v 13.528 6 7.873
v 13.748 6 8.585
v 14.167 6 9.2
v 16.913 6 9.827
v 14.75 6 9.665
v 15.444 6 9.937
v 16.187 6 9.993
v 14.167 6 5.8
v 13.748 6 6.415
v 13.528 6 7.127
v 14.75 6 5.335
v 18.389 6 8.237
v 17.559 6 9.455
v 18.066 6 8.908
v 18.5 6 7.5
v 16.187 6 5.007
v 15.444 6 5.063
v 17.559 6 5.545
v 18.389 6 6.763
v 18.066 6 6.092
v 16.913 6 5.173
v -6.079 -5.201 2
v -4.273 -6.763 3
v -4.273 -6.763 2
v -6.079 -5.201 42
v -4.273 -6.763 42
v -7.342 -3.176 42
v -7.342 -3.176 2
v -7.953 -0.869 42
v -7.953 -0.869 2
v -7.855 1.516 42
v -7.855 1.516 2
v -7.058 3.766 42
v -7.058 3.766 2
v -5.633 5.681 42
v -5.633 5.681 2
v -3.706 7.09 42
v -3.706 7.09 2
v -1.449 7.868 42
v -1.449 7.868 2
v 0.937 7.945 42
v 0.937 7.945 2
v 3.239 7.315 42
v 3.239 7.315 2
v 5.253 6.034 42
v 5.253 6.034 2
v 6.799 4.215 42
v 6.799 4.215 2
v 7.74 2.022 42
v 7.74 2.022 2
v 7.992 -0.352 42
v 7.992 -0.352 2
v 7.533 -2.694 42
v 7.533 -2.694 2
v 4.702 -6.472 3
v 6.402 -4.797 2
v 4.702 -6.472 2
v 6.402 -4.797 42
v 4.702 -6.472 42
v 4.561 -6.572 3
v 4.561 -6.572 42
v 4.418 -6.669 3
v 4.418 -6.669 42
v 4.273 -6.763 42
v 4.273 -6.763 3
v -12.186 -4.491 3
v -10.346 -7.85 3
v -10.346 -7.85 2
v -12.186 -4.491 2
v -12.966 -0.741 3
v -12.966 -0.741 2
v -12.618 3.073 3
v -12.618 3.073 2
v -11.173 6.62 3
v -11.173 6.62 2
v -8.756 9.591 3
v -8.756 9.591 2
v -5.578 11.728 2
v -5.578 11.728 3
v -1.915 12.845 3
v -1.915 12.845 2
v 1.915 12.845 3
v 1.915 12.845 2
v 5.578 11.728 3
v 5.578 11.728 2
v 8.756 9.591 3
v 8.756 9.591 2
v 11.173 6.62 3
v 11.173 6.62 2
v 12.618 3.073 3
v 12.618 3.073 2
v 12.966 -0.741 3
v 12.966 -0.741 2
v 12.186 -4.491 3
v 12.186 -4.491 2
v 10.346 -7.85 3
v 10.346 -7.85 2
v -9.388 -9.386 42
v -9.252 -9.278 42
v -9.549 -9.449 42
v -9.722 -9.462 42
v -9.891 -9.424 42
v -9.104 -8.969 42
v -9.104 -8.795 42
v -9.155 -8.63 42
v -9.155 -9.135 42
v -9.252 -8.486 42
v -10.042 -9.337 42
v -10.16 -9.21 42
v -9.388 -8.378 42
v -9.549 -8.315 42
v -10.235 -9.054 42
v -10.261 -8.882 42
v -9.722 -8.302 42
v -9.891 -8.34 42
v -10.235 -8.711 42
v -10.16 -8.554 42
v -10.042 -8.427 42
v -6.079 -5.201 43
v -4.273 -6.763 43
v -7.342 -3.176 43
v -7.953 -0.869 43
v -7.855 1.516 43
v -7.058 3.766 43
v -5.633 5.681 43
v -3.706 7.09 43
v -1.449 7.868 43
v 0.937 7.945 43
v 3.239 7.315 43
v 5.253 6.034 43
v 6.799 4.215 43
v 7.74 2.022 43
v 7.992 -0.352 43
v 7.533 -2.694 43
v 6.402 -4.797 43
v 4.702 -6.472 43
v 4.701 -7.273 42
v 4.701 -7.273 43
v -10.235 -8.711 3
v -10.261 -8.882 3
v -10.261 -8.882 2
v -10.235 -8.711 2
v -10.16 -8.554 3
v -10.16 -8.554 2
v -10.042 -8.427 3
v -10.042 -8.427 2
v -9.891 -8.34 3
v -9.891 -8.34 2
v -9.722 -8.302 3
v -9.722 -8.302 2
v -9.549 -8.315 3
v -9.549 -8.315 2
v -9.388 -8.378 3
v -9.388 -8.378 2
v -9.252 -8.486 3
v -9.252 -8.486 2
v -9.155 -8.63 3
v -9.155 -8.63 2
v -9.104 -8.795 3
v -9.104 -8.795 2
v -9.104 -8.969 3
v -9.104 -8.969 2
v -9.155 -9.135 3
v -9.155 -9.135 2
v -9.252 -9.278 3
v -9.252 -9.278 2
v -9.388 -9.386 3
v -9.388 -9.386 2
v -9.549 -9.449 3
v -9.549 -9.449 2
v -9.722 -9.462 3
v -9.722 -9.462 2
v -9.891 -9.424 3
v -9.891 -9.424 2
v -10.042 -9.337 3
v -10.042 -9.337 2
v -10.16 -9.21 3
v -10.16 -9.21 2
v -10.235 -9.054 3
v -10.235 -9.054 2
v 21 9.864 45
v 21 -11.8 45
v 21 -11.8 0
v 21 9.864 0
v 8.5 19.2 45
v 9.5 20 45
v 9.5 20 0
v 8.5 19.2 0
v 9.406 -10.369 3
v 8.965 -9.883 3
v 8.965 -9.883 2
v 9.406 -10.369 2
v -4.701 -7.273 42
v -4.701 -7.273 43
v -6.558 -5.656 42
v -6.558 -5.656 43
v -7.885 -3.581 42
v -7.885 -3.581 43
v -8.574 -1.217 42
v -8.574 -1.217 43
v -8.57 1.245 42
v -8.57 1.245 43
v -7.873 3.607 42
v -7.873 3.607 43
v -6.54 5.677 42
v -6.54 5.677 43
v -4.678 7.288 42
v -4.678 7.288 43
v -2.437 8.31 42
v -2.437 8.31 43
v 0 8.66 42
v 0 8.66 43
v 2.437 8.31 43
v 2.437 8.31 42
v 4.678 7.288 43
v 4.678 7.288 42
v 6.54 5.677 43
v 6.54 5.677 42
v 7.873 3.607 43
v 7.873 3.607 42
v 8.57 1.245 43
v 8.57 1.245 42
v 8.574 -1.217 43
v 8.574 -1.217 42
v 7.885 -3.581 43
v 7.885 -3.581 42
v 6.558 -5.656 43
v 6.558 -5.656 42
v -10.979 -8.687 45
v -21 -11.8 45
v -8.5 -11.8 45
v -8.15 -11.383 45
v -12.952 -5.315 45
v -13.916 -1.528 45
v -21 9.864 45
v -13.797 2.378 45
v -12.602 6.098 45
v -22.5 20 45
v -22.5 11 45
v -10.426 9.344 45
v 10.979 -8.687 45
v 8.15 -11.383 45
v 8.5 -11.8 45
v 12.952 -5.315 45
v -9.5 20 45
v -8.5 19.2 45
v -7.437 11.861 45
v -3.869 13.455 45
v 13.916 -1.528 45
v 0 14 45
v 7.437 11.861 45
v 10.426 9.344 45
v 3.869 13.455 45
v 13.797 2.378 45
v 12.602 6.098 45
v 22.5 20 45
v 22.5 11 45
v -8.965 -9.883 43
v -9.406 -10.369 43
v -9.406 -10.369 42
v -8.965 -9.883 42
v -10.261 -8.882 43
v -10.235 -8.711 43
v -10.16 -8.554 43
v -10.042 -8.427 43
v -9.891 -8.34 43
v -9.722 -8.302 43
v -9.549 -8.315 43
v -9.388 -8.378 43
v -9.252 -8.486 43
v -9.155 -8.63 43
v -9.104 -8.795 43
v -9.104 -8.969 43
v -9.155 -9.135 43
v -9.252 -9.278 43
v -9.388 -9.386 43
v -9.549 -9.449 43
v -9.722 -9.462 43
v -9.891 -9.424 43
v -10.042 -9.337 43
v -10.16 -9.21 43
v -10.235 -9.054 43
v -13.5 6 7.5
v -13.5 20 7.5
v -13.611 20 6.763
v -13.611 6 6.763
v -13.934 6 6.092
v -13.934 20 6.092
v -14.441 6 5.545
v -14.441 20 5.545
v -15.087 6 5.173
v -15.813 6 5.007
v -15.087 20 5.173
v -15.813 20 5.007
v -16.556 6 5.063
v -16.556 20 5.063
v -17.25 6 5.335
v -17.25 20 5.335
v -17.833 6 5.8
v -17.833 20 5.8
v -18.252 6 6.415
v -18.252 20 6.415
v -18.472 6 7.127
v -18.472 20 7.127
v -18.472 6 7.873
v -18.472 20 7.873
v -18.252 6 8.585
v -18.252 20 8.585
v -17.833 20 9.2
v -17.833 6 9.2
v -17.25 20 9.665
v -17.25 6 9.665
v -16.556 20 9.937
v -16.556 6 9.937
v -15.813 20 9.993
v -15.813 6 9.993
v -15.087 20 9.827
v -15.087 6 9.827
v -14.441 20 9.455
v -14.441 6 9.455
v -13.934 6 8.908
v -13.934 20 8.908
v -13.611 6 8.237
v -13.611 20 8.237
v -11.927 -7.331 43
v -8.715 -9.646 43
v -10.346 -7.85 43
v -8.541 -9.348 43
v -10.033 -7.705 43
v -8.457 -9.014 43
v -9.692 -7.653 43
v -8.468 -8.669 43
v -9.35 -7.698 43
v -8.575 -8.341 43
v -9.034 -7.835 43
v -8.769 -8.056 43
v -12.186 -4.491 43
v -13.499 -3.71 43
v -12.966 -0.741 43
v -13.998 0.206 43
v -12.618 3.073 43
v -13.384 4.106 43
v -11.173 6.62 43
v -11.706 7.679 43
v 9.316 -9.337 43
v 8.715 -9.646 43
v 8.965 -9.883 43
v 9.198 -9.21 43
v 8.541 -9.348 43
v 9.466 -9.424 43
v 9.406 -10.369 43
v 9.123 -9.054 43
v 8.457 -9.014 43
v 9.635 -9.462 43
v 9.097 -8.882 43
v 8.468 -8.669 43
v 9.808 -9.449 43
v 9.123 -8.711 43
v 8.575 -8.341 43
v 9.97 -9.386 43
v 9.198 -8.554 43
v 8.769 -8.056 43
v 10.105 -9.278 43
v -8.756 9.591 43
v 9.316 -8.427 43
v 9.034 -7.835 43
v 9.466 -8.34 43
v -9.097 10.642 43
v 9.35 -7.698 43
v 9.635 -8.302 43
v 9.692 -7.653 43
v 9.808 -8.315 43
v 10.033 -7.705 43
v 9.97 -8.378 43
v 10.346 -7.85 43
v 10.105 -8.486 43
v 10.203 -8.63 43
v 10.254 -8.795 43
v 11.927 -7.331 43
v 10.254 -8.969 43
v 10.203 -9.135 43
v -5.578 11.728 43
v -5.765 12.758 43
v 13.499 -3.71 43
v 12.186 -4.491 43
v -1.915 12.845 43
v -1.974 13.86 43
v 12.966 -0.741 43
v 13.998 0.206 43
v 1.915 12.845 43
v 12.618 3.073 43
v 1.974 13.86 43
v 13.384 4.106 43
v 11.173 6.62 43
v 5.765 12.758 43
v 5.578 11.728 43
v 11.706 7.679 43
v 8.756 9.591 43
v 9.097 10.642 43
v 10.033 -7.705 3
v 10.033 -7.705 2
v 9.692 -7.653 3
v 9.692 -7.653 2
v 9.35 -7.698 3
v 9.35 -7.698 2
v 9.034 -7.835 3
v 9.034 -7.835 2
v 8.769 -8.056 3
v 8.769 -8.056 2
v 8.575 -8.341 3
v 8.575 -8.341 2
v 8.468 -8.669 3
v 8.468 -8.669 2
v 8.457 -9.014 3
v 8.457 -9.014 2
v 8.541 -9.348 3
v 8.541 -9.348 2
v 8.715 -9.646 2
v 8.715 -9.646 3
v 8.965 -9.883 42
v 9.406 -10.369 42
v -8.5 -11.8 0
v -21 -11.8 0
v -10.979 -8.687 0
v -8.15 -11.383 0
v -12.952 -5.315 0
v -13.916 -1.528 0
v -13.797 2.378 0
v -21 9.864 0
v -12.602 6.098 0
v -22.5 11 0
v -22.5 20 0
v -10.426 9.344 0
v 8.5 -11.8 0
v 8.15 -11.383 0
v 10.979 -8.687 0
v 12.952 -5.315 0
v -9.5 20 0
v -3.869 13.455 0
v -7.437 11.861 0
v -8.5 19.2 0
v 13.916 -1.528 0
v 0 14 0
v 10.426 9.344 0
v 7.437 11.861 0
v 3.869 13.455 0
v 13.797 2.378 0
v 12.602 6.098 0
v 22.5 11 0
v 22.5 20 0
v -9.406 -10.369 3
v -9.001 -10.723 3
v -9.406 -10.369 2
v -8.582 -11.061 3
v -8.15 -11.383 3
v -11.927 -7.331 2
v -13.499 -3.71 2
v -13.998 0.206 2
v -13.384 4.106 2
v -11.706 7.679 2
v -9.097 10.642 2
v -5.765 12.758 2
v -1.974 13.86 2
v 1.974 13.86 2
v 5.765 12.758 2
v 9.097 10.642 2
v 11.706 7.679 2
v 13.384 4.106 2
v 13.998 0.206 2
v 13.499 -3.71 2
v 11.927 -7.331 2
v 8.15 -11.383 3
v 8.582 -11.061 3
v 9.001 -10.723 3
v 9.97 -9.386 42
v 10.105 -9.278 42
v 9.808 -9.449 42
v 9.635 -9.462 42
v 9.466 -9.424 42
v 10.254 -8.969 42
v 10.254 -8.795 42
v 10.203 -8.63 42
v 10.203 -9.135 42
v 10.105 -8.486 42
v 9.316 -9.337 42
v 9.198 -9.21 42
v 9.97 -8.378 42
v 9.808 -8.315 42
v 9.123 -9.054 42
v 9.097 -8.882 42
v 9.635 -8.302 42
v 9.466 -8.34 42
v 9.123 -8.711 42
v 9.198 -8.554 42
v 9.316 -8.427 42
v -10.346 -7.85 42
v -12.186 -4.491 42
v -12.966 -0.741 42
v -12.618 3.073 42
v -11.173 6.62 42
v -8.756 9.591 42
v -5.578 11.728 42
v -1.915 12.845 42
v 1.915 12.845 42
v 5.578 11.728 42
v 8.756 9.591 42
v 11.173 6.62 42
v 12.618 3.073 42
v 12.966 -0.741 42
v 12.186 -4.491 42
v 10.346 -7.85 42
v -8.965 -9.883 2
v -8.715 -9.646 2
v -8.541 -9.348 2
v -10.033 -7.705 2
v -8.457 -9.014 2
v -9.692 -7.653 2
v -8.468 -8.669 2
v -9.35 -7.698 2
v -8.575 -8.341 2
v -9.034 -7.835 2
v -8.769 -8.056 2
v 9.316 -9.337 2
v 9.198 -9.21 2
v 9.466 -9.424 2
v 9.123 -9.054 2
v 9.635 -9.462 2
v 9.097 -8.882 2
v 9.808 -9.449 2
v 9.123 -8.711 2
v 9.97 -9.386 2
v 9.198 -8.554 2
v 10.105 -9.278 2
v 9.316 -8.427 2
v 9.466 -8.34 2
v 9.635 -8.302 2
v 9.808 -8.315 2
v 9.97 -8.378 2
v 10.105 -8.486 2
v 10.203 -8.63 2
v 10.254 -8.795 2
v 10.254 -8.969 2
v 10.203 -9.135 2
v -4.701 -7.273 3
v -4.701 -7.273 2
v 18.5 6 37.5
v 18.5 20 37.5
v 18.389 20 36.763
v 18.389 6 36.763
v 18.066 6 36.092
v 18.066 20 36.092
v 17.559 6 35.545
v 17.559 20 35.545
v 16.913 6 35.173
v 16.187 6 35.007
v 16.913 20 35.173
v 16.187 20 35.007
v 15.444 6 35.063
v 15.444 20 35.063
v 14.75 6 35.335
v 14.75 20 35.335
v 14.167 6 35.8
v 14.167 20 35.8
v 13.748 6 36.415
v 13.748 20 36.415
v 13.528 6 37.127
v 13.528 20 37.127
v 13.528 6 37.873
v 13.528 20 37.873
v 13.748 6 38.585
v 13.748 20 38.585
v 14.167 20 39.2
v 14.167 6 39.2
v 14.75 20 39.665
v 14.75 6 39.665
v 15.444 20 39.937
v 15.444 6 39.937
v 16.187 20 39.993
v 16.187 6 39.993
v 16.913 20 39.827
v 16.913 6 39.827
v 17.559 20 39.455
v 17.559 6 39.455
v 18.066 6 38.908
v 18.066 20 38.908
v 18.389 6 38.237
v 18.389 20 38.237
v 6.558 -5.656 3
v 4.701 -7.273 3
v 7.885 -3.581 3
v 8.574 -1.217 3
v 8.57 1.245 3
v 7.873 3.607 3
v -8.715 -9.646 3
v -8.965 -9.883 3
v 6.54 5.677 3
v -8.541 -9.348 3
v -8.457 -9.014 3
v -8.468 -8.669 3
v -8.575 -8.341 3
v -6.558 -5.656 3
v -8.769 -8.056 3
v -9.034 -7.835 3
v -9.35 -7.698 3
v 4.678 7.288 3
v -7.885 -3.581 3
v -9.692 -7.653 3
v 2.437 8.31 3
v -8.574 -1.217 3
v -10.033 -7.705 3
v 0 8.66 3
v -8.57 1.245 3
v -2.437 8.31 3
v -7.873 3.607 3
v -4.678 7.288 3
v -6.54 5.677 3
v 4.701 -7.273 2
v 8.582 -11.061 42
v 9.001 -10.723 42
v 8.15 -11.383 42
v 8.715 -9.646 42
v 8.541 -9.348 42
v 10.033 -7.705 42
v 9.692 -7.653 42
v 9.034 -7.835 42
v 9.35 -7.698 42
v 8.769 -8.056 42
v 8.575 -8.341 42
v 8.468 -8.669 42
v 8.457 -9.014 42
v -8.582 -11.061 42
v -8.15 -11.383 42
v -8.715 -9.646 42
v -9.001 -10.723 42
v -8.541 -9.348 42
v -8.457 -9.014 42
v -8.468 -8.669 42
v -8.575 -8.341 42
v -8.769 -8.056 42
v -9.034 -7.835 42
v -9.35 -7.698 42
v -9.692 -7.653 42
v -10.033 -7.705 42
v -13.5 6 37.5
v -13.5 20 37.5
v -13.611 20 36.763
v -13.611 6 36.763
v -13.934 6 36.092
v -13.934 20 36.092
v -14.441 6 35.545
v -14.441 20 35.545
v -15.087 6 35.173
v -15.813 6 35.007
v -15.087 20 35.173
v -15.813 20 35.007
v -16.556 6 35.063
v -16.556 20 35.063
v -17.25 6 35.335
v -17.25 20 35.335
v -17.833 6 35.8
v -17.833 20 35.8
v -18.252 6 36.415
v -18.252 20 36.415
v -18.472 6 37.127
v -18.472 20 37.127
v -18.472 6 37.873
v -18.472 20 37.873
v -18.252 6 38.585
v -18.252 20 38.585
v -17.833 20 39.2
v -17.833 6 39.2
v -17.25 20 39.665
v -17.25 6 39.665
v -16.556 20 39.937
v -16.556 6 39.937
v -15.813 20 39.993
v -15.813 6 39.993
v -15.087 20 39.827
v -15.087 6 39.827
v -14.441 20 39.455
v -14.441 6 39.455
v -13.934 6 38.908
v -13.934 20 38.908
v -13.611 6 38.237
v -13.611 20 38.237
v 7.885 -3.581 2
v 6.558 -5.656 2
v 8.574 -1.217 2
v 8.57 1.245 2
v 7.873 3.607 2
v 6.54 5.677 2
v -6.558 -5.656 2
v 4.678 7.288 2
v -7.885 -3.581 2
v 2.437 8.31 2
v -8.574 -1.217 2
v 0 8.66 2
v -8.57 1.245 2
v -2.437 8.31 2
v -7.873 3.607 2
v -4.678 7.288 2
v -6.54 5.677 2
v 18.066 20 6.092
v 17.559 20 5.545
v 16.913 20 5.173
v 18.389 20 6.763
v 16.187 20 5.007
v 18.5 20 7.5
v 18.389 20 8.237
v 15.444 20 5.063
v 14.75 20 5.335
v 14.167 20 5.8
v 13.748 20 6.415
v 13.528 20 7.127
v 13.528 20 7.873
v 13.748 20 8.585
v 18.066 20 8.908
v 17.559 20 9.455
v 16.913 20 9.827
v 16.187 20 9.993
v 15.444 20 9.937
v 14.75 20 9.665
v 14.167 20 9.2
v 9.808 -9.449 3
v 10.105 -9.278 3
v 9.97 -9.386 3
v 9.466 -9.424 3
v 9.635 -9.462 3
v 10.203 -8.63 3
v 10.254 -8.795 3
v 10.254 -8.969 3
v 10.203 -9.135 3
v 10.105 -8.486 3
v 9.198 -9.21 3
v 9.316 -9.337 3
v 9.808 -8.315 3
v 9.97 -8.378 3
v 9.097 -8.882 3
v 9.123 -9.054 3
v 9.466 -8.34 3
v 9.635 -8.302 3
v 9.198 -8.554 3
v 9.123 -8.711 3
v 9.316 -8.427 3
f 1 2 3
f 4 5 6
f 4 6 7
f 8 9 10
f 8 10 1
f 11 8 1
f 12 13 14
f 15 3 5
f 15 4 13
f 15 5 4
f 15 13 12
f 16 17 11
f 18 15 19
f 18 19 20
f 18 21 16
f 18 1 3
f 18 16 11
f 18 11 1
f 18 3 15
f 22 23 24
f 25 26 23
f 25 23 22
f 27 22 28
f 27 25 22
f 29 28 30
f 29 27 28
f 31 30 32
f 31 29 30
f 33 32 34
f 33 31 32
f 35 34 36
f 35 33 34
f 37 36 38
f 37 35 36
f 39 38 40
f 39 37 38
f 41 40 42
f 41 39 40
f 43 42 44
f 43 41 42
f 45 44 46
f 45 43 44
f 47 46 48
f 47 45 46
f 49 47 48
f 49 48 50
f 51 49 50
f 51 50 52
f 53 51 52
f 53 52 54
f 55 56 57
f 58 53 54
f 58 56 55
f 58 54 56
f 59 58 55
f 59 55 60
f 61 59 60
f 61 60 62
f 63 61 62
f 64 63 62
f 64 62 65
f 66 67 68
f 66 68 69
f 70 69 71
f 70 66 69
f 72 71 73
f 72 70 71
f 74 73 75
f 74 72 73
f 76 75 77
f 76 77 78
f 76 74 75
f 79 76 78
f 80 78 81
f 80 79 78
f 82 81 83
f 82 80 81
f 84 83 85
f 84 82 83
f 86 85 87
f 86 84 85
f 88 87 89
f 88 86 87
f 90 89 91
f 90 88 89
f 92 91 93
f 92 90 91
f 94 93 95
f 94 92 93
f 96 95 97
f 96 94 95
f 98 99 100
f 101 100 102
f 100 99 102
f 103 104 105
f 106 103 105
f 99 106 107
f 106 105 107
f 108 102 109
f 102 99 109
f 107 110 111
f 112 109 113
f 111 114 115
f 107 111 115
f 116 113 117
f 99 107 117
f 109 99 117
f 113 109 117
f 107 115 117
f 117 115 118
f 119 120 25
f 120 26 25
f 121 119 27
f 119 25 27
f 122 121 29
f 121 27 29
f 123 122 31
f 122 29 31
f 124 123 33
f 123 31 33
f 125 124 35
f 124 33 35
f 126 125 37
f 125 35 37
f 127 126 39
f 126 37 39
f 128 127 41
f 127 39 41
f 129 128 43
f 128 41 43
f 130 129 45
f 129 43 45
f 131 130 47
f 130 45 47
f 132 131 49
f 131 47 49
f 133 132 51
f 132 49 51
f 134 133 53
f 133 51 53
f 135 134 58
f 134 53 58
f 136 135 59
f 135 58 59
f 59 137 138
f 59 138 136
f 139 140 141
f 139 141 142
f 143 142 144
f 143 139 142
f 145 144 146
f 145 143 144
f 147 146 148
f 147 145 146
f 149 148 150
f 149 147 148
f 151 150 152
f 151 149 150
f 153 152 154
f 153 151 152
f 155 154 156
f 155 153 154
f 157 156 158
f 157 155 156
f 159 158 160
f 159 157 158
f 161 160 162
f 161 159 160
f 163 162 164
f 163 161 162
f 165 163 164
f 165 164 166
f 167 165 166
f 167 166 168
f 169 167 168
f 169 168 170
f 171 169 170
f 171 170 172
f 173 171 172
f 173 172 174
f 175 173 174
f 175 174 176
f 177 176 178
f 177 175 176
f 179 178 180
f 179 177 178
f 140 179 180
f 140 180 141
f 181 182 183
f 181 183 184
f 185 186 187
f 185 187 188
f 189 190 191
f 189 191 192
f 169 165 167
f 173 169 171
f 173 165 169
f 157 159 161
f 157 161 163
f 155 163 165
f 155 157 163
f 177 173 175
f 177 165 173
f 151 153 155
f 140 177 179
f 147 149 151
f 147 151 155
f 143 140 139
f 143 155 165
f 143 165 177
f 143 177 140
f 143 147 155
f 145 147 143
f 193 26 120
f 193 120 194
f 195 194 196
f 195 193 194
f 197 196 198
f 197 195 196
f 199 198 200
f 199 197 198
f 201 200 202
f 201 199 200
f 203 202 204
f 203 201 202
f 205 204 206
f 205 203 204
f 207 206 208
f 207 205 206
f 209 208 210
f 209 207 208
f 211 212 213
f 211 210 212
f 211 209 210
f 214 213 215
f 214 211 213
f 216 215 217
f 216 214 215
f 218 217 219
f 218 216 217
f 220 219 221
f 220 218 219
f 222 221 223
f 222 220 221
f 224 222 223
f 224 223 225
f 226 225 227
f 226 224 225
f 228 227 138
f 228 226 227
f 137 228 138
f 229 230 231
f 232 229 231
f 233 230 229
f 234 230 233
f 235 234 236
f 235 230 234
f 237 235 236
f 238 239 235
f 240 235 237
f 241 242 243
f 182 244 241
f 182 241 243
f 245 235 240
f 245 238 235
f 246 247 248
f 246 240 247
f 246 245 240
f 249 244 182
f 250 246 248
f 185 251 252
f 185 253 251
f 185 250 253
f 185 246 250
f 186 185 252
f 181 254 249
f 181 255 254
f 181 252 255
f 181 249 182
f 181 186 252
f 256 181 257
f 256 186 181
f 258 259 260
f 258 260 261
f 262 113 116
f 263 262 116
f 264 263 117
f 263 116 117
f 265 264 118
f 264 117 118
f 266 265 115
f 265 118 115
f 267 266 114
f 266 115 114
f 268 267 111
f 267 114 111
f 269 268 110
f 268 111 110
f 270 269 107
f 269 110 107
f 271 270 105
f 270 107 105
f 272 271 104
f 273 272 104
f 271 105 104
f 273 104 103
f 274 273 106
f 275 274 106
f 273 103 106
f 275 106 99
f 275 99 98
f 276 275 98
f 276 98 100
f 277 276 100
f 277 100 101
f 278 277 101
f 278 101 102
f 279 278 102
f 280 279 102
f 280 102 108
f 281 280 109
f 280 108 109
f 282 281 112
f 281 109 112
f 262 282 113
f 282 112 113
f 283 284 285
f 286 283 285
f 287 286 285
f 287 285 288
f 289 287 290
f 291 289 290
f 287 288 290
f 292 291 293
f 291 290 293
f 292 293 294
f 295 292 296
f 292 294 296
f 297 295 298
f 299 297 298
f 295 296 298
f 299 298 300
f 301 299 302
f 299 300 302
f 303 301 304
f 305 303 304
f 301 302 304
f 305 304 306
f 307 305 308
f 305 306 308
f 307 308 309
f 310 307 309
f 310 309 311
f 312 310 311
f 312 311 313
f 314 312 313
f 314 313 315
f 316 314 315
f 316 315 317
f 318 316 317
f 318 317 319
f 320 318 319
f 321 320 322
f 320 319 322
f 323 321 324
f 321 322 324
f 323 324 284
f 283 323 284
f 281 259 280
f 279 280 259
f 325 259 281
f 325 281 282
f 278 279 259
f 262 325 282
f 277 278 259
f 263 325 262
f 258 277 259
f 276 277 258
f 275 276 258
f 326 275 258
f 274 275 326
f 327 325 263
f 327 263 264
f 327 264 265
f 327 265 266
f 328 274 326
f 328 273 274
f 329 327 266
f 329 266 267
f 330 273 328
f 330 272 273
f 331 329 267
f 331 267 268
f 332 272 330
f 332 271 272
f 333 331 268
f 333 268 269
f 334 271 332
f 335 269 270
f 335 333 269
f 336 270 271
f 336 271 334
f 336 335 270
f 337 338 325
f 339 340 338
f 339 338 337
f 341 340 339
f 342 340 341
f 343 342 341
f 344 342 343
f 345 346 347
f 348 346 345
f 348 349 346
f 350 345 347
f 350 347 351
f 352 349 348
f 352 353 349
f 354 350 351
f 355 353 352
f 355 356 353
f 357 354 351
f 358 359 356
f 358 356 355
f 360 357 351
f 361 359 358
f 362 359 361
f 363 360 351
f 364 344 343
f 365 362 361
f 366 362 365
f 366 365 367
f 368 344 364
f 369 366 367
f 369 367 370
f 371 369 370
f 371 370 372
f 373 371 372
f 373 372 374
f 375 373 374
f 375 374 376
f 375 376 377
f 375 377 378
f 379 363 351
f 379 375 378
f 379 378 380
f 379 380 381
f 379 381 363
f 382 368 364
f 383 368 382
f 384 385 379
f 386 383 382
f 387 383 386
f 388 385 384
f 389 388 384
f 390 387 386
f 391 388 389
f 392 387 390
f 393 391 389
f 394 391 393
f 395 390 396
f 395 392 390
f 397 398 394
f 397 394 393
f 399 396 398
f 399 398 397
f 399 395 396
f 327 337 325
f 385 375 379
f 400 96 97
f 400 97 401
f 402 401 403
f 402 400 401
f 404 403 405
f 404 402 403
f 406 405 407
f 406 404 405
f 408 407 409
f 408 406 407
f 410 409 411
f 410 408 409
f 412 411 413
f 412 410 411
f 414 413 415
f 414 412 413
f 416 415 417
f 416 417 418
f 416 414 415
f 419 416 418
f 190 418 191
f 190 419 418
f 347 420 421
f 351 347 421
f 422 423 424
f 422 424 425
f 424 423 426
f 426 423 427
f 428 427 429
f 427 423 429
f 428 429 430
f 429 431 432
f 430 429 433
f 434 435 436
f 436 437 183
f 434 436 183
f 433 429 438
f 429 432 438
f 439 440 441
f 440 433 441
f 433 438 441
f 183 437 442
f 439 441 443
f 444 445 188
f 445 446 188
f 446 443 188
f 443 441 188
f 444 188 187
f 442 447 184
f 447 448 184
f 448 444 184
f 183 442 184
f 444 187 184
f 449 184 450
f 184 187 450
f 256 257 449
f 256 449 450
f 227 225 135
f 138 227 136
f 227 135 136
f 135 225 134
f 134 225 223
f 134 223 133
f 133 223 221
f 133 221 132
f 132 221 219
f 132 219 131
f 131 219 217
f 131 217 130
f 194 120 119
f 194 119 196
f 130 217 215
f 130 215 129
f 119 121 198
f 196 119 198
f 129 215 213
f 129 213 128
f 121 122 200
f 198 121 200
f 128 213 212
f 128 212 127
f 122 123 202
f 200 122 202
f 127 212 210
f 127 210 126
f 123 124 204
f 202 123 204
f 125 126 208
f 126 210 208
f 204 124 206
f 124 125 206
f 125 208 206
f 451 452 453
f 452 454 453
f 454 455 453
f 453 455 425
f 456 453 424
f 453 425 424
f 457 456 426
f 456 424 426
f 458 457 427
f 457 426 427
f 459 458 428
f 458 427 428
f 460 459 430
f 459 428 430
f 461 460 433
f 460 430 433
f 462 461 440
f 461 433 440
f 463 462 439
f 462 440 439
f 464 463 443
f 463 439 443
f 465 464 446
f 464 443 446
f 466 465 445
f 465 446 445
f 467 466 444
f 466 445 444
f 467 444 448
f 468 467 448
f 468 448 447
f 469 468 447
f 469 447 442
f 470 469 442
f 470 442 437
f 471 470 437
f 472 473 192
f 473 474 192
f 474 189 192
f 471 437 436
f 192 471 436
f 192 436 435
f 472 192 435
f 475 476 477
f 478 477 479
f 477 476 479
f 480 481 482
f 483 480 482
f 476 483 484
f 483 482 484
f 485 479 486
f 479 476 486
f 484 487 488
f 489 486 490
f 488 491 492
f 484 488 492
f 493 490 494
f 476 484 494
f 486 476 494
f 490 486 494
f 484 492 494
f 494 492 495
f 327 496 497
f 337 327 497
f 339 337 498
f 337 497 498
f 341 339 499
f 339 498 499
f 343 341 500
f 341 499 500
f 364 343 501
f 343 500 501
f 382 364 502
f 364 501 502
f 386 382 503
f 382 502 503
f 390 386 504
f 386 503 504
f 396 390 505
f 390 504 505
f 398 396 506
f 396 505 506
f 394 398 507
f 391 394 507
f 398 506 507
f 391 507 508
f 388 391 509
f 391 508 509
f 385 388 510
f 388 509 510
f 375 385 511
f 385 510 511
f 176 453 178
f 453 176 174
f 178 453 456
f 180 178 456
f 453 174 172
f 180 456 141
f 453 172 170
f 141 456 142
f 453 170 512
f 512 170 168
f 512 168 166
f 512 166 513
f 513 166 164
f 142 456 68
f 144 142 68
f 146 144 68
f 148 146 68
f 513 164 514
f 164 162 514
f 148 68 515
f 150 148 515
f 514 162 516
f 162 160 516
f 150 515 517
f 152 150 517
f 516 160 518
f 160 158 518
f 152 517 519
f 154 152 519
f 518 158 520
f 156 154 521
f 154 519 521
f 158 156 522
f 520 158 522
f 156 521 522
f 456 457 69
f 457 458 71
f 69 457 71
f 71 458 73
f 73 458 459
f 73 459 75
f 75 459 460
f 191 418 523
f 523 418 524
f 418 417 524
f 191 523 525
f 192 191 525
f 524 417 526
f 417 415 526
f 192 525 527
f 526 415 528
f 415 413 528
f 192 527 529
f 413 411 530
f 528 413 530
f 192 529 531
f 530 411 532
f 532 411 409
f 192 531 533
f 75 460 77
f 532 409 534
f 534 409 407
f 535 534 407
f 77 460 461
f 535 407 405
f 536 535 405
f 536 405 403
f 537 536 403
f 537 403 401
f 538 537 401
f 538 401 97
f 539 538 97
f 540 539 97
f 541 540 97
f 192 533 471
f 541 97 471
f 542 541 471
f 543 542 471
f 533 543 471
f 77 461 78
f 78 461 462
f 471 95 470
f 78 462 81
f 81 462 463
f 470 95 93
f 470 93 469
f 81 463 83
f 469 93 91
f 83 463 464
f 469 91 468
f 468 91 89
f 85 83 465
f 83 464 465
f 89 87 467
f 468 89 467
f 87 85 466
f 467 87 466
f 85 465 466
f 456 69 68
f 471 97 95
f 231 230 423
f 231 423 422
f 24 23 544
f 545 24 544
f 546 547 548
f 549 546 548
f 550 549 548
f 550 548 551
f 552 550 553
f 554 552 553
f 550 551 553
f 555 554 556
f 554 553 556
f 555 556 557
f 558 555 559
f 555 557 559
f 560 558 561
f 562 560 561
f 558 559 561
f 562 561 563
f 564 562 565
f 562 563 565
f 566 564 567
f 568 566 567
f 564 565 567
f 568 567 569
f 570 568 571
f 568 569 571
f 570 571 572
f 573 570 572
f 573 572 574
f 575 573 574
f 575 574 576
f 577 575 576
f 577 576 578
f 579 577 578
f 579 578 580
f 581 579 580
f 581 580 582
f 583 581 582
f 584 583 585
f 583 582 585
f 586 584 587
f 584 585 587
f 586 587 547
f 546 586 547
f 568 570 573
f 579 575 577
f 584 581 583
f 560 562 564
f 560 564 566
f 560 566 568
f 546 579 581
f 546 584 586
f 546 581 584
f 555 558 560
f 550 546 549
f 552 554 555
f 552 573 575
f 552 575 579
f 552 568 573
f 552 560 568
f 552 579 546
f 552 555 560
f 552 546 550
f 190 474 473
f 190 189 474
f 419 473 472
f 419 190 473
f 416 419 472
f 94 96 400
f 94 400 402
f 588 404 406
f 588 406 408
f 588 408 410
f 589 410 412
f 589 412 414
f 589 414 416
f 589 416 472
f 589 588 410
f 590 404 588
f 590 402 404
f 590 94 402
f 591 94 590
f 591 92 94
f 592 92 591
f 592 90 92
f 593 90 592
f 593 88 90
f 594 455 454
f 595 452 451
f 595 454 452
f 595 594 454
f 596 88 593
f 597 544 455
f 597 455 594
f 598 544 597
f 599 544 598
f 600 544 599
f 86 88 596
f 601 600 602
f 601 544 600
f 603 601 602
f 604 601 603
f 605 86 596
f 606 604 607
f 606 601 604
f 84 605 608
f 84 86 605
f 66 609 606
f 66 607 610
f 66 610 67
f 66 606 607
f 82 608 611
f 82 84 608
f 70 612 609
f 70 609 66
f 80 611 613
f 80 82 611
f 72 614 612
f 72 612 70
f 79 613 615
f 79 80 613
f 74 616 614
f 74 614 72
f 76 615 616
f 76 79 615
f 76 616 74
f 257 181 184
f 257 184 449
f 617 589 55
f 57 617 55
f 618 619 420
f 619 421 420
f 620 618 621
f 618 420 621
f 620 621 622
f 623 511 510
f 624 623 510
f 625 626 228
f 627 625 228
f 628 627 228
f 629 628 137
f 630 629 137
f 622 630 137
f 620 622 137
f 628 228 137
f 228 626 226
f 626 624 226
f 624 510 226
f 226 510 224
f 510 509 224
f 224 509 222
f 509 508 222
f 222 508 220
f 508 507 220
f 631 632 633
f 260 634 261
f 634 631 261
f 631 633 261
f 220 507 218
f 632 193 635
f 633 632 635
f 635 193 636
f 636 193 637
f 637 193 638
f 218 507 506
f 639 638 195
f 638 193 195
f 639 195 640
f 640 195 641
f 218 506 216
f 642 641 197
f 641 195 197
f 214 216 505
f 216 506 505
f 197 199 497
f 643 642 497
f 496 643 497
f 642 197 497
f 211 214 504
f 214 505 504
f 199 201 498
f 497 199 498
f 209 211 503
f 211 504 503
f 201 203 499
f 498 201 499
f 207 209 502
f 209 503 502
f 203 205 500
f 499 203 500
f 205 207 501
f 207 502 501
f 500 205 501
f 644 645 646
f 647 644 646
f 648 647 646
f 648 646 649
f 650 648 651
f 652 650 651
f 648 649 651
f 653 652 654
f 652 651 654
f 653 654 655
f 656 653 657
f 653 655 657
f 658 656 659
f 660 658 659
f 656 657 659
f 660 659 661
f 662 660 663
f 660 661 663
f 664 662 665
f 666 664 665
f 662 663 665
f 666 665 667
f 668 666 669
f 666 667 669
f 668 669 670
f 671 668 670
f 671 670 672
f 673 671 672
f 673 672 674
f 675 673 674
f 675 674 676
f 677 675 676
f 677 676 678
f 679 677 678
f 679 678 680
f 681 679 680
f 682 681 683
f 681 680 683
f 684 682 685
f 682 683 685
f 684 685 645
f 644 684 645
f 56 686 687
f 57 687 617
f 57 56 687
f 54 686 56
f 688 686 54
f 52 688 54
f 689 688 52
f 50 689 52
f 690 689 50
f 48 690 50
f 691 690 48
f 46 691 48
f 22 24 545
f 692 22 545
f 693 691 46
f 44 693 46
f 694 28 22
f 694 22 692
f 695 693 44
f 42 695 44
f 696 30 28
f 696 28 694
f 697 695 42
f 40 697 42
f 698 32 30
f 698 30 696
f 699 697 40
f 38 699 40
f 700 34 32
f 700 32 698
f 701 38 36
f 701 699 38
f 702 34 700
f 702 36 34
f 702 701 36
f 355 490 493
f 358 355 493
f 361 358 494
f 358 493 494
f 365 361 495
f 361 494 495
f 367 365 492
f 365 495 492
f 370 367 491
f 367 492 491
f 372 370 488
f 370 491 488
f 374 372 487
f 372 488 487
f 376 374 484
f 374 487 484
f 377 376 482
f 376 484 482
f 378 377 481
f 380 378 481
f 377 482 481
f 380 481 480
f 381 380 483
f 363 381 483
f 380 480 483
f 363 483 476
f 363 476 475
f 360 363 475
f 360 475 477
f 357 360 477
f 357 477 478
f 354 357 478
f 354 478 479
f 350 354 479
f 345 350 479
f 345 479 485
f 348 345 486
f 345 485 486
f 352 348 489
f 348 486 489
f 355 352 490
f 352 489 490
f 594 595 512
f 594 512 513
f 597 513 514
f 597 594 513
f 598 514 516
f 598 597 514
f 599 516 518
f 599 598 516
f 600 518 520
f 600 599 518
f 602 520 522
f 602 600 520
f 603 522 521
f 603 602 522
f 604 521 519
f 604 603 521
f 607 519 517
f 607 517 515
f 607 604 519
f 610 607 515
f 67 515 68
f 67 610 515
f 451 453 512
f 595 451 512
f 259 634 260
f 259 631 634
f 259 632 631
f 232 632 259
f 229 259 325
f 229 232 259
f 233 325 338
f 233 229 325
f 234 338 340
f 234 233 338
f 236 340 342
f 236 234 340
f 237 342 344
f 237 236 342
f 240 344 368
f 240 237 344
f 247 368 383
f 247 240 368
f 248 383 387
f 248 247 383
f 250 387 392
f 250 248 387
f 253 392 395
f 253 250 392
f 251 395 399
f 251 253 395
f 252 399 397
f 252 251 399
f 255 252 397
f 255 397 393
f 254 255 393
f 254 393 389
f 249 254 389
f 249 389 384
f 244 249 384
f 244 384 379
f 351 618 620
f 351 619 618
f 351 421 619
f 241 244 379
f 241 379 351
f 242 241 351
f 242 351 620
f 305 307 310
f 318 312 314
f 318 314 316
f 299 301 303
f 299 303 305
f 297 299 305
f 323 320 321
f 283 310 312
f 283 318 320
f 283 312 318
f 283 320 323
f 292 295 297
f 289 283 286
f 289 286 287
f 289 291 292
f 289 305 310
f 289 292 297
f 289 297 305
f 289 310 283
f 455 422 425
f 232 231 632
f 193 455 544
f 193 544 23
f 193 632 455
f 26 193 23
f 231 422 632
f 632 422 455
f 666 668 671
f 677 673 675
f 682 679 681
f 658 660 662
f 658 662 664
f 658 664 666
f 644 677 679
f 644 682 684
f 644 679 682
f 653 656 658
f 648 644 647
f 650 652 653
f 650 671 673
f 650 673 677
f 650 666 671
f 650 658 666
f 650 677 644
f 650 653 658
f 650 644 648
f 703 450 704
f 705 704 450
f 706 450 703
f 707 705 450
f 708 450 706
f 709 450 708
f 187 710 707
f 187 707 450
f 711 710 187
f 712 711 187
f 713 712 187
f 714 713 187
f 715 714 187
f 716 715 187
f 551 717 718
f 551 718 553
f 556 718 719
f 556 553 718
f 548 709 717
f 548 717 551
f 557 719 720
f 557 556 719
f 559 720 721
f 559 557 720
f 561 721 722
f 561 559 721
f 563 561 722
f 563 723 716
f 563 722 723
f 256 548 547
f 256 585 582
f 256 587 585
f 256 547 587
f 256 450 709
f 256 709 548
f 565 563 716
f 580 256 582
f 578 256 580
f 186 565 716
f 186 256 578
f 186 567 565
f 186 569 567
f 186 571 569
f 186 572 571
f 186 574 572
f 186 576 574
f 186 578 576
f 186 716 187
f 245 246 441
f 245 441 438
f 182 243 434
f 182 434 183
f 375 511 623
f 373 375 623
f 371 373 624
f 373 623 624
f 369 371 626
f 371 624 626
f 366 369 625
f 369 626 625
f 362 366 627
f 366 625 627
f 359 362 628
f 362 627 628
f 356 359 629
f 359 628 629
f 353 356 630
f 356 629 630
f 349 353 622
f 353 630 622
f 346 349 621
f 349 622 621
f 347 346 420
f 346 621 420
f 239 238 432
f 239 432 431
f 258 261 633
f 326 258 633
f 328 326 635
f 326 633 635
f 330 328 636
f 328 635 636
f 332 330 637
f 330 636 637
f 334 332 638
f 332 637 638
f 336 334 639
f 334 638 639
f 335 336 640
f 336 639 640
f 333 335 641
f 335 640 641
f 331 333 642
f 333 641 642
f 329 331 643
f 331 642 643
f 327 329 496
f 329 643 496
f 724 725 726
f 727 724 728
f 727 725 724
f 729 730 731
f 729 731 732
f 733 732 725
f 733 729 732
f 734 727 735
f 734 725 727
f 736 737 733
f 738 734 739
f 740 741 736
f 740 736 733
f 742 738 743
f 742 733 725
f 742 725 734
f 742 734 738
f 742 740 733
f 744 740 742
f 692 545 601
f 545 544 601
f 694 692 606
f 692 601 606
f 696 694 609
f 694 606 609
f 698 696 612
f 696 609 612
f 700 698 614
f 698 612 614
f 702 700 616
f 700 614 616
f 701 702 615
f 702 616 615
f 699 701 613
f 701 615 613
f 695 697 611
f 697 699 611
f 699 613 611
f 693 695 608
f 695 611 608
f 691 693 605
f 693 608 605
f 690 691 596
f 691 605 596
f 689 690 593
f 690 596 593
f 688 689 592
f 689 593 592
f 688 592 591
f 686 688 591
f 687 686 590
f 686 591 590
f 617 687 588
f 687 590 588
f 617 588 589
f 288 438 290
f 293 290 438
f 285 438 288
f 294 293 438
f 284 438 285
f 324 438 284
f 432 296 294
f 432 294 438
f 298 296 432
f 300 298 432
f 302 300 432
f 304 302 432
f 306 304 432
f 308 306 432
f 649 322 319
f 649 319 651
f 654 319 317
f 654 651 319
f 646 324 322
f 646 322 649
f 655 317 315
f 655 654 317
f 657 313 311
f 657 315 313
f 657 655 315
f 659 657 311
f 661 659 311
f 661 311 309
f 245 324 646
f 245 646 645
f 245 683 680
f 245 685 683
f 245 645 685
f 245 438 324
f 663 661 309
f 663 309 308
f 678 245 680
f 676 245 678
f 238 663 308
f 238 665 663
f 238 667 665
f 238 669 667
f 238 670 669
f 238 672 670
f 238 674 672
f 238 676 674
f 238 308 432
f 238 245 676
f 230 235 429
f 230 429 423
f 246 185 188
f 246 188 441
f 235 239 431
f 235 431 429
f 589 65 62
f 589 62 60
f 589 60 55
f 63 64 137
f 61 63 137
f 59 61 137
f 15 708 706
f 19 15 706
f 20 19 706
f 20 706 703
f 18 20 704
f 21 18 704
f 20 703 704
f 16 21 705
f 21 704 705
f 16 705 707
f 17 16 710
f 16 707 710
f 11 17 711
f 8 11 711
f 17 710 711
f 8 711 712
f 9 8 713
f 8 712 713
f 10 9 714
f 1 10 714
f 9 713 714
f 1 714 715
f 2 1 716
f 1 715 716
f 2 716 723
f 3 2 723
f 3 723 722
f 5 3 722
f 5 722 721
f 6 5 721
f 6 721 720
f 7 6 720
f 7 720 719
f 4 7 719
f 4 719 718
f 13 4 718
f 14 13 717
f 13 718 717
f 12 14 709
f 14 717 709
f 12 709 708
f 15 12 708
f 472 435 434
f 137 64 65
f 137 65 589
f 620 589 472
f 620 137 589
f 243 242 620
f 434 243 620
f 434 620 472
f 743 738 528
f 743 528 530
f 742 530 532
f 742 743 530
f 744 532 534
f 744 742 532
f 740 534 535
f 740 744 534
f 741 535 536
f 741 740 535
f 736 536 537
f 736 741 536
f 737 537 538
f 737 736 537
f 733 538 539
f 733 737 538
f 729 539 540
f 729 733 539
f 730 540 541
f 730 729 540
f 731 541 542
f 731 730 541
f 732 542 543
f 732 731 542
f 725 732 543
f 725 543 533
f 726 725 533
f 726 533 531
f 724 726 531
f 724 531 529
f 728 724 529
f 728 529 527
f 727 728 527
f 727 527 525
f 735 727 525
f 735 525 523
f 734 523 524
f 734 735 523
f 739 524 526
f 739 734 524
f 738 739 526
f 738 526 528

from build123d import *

# Parameters (mm, degrees)
RESSALTO_EXTRUS_O1_DEPTH = 45
ESBO_O3_R                = 14
CORTE_EXTRUS_O2_DEPTH    = 3
ESBO_O4_R                = 8.659932388
ESBO_O4_R_2              = 8
RESSALTO_EXTRUS_O2_DEPTH = 1
CORTE_EXTRUS_O3_DEPTH    = 1
ESBO_O6_R                = 0.581806569
RESSALTO_EXTRUS_O3_DEPTH = 1
ESBO_O8_W                = 66.682798833
ESBO_O8_H                = 46.433556561
CORTE_EXTRUS_O5_DEPTH    = 23.5
ESBO_O9_R                = 2.5
CORTE_EXTRUS_O6_DEPTH    = 14


with BuildPart() as part:
    # Esboço1 → Ressalto-extrusão1 (new body)
    with BuildSketch(Plane.XY):
        with BuildLine():
            Line((-22.5, 20), (-22.5, 11))
            Line((-22.5, 11), (-21, 9.864062641))
            Line((-21, 9.864062641), (-21, -11.8))
            Line((-21, -11.8), (-8.5, -11.8))
            Line((-8.5, -11.8), (-4.27343132, -6.762971592))
            ThreePointArc((-4.27343132, -6.762971592), (0, 8), (4.27343132, -6.762971592))
            Line((4.27343132, -6.762971592), (8.5, -11.8))
            Line((8.5, -11.8), (21, -11.8))
            Line((21, -11.8), (21, 9.864062641))
            Line((21, 9.864062641), (22.5, 11))
            Line((22.5, 11), (22.5, 20))
            Line((22.5, 20), (9.5, 20))
            Line((9.5, 20), (8.5, 19.2))
            Line((8.5, 19.2), (-8.5, 19.2))
            Line((-8.5, 19.2), (-9.5, 20))
            Line((-9.5, 20), (-22.5, 20))
        make_face()
    extrude(amount=RESSALTO_EXTRUS_O1_DEPTH)

    # Esboço3 → Corte-extrusão2 (cut)
    with BuildSketch(Plane(origin=(0, 0, 0), x_dir=(-1, 0, 0), z_dir=(0, 0, -1))):
        Circle(ESBO_O3_R)
    extrude(amount=-CORTE_EXTRUS_O2_DEPTH, mode=Mode.SUBTRACT)

    # Esboço4 → Ressalto-extrusão2 (add)
    with BuildSketch(Plane(origin=(0, 0, 3), x_dir=(-1, 0, 0), z_dir=(0, 0, -1))):
        Circle(ESBO_O4_R)
        Circle(ESBO_O4_R_2, mode=Mode.SUBTRACT)
    extrude(amount=RESSALTO_EXTRUS_O2_DEPTH)

    # Esboço5 → Corte-extrusão3 (cut)
    with BuildSketch(Plane(origin=(0, 0, 3), x_dir=(-1, 0, 0), z_dir=(0, 0, -1))):
        Polygon((-8.150170401, -11.383089319), (-4.701200585, -7.27276715), (-4.703249192, -5.654958468), (3.343697917, -5.654958468), (4.701200585, -7.27276715), (8.150170401, -11.383089319), (0.388307104, -10.144815057), align=None)
    extrude(amount=CORTE_EXTRUS_O3_DEPTH, mode=Mode.SUBTRACT)

    # Esboço6 → Ressalto-extrusão3 (add)
    with BuildSketch(Plane(origin=(0, 0, 3), x_dir=(-1, 0, 0), z_dir=(0, 0, -1))):
        with BuildLine():
            Line((-8.96541648, -9.883119832), (-9.879437481, -10.890700362))
            ThreePointArc((-9.879437481, -10.890700362), (0, 14.704102805), (9.879437481, -10.890700362))
            Line((9.879437481, -10.890700362), (8.96541648, -9.883119832))
            ThreePointArc((8.96541648, -9.883119832), (8.661852403, -8.191590578), (10.346023957, -7.849554692))
            ThreePointArc((10.346023957, -7.849554692), (0, 12.986751733), (-10.346023957, -7.849554692))
            ThreePointArc((-10.346023957, -7.849554692), (-8.661852403, -8.191590578), (-8.96541648, -9.883119832))
        make_face()
        with Locations((-9.678899136, -8.882073659)):
            Circle(ESBO_O6_R, mode=Mode.SUBTRACT)
        with Locations((9.678899136, -8.882073659)):
            Circle(ESBO_O6_R, mode=Mode.SUBTRACT)
    extrude(amount=RESSALTO_EXTRUS_O3_DEPTH)

    # Esboço8 → Corte-extrusão5 (cut, through all)
    with BuildSketch(Plane.XY.offset(22.5)):
        with Locations((0.496680915, 3.185740871)):
            Rectangle(ESBO_O8_W, ESBO_O8_H)
    extrude(amount=CORTE_EXTRUS_O5_DEPTH, mode=Mode.SUBTRACT)

    # Espelhar14: part across plane


with BuildPart() as part_1:
    add(part.part)
    add(part.part.mirror(Plane.XY.offset(22.5)))

    # Esboço9 → Corte-extrusão6 (cut)
    with BuildSketch(Plane(origin=(0, 20, 0), x_dir=(1, 0, 0), z_dir=(0, 1, 0))):
        with Locations((-16, -7.5)):
            Circle(ESBO_O9_R)
        with Locations((16, -7.5)):
            Circle(ESBO_O9_R)
        with Locations((16, -37.5)):
            Circle(ESBO_O9_R)
        with Locations((-16, -37.5)):
            Circle(ESBO_O9_R)
    extrude(amount=-CORTE_EXTRUS_O6_DEPTH, mode=Mode.SUBTRACT)


solid = part_1.part
